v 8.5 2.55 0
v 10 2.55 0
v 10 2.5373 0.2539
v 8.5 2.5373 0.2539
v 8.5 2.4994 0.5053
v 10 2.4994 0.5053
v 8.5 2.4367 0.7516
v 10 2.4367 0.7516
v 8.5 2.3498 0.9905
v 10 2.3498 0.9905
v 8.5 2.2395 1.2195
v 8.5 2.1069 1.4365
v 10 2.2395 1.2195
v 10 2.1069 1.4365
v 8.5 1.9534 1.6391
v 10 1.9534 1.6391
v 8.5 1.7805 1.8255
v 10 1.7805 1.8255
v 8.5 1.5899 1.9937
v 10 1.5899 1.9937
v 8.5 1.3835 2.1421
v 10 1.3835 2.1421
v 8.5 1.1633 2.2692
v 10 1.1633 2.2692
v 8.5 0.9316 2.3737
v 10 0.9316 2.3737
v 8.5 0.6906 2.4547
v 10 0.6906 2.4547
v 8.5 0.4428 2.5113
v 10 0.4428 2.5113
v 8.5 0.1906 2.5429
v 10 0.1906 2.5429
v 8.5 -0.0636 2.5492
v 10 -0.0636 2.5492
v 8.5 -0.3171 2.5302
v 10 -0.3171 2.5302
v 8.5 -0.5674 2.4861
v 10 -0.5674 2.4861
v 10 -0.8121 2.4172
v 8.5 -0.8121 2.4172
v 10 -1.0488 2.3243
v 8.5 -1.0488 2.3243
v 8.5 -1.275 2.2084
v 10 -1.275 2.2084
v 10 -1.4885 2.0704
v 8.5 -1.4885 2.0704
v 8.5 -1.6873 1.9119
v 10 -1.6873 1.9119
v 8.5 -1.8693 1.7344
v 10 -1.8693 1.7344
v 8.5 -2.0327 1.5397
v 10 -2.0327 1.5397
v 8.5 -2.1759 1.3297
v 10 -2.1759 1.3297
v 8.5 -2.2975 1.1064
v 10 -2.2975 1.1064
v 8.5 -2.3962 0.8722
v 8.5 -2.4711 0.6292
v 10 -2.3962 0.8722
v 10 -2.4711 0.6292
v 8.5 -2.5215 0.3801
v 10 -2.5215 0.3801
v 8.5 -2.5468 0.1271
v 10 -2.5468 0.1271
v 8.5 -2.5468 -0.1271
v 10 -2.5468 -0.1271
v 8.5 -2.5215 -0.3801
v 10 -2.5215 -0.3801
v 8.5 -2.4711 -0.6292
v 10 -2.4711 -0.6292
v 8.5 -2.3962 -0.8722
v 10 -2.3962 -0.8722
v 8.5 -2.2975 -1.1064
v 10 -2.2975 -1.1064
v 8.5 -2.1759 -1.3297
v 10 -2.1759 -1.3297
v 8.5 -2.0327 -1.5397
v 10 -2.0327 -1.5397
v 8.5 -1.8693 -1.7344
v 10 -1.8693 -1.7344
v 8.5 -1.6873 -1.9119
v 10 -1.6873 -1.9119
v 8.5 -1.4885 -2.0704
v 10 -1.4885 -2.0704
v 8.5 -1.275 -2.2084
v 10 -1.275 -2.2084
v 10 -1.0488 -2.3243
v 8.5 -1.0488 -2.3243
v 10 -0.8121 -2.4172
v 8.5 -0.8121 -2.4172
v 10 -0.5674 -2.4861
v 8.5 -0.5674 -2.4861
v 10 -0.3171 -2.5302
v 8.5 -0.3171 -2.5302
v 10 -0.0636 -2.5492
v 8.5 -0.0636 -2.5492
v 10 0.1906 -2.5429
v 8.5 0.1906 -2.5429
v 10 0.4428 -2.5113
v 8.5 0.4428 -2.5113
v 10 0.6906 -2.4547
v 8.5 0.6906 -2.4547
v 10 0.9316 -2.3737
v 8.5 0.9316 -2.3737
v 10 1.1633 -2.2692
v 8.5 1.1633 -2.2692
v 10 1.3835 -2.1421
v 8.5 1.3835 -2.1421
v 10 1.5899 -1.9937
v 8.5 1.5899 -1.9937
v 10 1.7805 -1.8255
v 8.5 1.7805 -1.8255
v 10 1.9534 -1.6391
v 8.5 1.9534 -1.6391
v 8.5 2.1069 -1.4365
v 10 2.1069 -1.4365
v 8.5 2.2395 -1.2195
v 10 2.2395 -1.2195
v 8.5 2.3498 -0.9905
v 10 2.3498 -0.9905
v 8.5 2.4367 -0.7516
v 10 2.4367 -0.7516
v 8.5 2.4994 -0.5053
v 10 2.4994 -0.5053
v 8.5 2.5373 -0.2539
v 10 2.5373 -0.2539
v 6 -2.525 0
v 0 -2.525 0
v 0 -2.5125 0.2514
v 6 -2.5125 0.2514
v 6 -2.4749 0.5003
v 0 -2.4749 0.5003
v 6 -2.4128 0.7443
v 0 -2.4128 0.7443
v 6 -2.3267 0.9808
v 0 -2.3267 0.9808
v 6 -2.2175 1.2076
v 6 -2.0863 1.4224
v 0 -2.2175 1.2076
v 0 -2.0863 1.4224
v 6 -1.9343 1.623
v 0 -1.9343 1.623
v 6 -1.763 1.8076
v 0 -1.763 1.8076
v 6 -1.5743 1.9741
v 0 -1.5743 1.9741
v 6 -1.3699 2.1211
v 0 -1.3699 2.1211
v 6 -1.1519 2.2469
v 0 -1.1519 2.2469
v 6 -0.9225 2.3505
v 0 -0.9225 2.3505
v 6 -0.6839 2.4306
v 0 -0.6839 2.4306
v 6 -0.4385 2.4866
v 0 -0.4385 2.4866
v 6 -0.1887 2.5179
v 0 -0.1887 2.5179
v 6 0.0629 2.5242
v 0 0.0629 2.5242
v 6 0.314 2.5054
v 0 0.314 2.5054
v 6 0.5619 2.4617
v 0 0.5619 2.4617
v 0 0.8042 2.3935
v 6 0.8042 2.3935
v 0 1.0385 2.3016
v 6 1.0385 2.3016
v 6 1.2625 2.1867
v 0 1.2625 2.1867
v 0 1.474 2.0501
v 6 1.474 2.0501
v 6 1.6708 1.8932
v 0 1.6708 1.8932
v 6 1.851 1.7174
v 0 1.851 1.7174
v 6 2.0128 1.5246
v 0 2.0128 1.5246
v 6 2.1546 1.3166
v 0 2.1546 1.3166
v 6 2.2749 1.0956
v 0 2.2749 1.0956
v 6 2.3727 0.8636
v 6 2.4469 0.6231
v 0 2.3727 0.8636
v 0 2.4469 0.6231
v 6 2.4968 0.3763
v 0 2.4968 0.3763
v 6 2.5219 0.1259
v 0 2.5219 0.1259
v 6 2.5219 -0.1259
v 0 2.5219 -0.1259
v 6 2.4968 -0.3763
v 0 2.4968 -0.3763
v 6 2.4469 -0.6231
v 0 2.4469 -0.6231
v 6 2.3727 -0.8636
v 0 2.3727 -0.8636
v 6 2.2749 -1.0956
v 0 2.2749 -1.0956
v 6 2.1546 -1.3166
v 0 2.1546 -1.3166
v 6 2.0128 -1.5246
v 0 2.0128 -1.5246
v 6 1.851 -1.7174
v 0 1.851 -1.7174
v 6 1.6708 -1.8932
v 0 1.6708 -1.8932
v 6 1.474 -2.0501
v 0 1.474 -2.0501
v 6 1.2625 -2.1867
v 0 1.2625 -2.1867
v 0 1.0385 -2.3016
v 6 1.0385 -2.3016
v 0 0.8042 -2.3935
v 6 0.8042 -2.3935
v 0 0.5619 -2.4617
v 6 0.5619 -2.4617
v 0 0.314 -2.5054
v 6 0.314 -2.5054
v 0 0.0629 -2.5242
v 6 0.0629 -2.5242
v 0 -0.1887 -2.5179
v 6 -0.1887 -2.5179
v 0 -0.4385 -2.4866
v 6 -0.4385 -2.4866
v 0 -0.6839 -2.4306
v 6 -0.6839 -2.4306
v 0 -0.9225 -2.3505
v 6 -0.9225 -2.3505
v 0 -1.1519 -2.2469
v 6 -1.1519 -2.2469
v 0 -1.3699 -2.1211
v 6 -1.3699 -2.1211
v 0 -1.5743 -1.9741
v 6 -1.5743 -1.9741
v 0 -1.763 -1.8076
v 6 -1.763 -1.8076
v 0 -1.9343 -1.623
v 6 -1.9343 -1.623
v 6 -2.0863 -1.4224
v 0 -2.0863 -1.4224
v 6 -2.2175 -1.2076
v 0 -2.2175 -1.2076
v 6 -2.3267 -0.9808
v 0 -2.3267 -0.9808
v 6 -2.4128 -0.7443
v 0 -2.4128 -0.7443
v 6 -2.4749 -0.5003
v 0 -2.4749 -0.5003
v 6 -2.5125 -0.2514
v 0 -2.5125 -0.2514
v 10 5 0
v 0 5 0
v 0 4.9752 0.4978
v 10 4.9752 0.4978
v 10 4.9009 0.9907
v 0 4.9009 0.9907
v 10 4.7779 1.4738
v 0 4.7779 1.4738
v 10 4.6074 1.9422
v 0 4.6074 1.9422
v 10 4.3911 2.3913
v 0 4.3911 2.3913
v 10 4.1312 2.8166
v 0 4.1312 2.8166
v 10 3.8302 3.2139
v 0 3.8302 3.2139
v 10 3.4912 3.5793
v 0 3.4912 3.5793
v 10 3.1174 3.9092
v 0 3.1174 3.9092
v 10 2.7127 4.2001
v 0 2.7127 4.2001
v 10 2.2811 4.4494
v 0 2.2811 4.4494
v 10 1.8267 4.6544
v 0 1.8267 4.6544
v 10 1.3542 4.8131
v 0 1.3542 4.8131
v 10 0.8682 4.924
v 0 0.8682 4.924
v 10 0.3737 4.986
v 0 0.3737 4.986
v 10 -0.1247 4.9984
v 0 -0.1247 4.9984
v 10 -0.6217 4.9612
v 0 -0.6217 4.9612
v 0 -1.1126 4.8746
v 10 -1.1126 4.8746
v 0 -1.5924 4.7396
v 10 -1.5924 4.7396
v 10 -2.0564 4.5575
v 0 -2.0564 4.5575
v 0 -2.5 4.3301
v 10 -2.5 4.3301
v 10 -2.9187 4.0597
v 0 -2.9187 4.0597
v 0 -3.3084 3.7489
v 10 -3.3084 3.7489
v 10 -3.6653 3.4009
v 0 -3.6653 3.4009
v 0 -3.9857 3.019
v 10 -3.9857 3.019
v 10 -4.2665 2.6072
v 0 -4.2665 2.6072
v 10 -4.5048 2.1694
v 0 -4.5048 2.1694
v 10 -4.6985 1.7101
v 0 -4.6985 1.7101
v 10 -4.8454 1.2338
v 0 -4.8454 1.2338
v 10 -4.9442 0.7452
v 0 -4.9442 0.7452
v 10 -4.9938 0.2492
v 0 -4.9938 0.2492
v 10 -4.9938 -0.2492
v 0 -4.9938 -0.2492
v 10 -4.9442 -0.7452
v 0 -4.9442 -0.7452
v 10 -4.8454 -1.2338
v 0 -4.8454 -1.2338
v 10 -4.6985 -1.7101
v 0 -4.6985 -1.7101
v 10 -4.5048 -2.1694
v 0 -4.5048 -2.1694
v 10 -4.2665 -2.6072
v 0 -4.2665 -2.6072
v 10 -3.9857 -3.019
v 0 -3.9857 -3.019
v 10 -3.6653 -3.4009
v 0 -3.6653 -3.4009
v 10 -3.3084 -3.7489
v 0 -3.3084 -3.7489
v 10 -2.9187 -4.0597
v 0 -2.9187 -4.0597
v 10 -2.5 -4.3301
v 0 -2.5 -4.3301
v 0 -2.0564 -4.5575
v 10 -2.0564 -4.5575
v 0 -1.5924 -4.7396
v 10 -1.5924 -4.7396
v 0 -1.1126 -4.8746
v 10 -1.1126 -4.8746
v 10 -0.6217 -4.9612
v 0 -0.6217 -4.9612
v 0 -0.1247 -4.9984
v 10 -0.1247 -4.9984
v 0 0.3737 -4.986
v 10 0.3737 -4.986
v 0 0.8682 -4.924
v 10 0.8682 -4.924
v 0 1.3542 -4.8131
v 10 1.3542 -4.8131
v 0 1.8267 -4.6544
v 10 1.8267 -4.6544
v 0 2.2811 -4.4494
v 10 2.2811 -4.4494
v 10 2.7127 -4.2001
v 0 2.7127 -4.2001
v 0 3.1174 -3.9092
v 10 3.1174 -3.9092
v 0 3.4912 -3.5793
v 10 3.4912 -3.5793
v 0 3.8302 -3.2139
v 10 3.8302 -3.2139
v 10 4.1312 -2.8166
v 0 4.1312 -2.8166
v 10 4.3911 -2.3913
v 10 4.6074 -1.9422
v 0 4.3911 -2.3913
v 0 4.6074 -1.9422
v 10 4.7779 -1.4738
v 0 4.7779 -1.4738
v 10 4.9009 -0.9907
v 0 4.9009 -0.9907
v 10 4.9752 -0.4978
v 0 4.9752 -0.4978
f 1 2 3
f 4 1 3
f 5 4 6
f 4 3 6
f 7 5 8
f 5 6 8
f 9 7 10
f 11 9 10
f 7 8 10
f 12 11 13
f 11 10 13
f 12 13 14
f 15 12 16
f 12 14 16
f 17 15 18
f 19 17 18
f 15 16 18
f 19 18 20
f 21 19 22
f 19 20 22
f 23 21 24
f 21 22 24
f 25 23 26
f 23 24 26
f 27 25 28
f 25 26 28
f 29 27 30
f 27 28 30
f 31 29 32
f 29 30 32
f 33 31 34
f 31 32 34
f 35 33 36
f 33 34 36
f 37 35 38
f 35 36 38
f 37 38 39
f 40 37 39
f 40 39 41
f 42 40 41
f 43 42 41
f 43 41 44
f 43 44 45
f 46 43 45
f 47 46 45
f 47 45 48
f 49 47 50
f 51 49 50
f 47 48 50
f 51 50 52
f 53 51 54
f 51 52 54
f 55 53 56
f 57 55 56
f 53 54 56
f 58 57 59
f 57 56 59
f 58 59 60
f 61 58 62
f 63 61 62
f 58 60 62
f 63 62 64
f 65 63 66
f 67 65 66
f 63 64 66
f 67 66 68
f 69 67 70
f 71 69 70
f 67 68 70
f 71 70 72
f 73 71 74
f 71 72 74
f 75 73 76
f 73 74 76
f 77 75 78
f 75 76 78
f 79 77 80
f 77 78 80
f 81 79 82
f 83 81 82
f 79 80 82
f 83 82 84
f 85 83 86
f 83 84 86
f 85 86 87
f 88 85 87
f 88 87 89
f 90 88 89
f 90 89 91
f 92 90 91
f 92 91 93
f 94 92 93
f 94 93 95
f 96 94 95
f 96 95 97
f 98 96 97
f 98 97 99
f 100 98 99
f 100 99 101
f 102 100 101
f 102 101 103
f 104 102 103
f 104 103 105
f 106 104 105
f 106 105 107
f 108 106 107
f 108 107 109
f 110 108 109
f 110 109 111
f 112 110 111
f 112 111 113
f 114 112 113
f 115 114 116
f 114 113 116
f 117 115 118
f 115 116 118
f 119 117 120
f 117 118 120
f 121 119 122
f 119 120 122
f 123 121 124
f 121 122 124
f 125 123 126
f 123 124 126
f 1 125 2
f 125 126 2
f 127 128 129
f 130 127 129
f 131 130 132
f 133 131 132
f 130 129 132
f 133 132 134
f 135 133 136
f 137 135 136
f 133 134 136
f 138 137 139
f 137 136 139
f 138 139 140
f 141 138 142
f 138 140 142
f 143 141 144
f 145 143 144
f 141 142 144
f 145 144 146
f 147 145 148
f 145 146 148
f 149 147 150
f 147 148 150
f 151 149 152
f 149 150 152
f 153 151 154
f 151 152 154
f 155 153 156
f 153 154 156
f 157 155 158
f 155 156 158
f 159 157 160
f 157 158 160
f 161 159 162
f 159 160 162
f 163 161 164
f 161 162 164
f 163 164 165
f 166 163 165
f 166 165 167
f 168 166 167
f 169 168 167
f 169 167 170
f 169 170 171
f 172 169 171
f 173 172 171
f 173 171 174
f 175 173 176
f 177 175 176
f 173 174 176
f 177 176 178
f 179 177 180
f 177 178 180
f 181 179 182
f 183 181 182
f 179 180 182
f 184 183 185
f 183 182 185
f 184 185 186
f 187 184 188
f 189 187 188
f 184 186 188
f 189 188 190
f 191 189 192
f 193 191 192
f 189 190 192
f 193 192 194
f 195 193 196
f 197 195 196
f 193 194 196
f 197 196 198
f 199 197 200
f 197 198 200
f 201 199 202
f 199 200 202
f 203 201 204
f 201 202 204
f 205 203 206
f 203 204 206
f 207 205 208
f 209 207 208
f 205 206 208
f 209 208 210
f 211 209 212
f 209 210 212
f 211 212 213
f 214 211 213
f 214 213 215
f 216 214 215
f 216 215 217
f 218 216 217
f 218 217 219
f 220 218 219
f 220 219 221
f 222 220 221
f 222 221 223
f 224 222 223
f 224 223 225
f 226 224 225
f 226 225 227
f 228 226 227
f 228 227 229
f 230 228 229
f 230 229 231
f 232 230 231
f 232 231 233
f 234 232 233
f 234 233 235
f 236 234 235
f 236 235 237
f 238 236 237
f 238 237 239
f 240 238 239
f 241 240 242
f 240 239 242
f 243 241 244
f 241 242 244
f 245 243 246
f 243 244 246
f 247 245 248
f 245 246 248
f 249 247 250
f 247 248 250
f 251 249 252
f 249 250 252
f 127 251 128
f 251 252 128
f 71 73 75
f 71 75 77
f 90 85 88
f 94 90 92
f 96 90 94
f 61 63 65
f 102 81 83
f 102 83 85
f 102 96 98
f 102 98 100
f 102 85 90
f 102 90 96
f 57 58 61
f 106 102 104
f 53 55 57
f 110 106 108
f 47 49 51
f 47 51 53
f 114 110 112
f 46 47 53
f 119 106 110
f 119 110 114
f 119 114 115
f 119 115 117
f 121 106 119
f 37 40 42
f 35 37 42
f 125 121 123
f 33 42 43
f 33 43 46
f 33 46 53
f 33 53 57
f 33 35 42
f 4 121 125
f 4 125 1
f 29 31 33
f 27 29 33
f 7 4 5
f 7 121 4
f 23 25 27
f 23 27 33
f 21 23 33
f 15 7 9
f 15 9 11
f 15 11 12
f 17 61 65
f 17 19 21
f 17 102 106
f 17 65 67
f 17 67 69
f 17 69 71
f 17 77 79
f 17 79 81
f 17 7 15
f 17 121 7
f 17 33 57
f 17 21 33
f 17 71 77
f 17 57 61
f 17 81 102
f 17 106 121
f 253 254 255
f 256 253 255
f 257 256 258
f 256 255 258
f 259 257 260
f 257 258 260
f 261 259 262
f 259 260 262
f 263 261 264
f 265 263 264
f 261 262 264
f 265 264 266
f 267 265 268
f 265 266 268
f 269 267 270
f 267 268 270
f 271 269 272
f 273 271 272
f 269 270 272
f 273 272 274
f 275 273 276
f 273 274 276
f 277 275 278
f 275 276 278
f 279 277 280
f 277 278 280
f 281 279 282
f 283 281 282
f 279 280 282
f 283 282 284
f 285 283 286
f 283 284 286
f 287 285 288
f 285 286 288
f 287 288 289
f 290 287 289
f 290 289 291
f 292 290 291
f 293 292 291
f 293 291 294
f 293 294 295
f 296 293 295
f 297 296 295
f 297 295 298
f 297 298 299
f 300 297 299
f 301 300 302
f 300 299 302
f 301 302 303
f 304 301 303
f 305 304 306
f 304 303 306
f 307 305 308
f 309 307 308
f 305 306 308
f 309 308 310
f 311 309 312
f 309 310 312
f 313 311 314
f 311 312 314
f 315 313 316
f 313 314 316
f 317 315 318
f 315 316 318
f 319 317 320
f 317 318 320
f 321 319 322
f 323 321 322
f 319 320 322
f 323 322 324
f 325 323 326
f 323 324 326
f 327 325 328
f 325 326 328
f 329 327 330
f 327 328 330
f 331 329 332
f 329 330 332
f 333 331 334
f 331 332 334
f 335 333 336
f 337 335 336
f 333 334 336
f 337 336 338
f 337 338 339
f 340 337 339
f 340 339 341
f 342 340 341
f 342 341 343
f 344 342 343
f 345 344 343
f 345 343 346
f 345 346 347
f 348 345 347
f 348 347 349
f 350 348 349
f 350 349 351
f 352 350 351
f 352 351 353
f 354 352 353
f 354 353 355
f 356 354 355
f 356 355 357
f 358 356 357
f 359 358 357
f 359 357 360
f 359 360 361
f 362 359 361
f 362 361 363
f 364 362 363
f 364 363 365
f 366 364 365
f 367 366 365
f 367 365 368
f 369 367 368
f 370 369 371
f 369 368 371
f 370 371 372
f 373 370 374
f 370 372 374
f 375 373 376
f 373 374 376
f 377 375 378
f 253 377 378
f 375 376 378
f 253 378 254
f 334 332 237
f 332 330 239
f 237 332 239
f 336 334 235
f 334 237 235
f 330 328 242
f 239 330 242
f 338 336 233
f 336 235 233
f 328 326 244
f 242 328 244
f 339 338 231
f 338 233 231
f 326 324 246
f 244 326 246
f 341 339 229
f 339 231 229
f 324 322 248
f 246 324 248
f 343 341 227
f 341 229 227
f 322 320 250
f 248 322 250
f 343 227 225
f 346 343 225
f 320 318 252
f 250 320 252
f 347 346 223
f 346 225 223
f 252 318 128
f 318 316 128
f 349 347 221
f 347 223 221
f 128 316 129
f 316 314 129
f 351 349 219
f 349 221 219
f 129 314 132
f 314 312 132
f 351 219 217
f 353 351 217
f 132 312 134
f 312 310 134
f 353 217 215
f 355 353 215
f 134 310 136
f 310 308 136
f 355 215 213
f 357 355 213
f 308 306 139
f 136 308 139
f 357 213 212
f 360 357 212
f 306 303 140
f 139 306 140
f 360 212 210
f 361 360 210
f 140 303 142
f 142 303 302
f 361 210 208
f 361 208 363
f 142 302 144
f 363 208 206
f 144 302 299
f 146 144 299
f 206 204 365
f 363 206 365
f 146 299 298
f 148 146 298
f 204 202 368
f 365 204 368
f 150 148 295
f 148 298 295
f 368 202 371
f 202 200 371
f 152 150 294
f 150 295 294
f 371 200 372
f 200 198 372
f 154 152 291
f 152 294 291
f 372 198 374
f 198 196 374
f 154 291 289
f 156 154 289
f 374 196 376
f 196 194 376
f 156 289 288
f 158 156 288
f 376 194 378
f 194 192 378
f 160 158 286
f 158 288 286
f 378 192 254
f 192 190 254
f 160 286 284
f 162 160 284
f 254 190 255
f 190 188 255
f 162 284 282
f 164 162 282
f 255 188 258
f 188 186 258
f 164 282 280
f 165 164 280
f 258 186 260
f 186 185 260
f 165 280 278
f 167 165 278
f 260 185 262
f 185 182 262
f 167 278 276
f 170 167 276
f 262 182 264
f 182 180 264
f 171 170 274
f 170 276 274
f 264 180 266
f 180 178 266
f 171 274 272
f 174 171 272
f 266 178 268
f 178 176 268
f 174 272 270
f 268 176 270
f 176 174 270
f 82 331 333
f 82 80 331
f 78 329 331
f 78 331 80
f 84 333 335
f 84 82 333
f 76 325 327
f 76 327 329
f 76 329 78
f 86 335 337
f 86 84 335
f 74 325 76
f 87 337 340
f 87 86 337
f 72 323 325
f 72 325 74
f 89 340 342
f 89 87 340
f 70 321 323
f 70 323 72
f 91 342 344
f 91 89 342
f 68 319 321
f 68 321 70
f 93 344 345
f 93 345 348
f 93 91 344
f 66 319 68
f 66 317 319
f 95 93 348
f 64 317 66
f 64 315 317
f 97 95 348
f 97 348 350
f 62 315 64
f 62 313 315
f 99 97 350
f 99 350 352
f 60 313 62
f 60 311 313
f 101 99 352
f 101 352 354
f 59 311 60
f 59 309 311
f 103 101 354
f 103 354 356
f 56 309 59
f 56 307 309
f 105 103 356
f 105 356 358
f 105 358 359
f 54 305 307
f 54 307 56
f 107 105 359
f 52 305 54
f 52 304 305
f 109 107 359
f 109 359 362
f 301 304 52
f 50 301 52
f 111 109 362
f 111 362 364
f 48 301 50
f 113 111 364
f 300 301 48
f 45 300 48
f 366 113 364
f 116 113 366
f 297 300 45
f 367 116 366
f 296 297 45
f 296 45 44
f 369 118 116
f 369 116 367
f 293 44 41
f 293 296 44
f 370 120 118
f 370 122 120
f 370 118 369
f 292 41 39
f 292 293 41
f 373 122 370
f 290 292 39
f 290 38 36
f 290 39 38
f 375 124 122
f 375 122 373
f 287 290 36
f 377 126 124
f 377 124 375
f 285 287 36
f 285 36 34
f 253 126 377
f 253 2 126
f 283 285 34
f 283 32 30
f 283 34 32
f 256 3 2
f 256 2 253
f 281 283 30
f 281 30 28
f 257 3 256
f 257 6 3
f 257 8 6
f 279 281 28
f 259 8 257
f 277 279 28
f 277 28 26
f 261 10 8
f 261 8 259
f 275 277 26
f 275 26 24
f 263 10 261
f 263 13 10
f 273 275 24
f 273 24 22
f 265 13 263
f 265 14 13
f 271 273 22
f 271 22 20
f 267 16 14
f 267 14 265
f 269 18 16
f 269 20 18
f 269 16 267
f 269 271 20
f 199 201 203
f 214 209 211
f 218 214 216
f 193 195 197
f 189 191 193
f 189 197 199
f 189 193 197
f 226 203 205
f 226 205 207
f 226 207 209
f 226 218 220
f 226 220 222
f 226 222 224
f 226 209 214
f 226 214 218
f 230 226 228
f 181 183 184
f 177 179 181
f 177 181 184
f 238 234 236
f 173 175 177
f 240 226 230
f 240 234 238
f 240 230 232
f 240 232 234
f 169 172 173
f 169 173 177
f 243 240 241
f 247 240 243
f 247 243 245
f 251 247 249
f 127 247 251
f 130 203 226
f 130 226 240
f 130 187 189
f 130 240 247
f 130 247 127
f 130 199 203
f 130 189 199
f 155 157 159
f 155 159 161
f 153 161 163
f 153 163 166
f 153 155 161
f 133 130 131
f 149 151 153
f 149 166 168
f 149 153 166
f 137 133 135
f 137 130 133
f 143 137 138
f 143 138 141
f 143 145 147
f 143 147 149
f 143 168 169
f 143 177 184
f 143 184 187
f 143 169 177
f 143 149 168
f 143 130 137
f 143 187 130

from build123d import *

# Parameters (mm, degrees)
SKETCH1_R           = 5
BOSS_EXTRUDE1_DEPTH = 10
SKETCH2_R           = 2.55
CUT_EXTRUDE1_DEPTH  = 1.5
SKETCH4_R           = 2.525
CUT_EXTRUDE2_DEPTH  = 6


with BuildPart() as part:
    # Sketch1 → Boss-Extrude1 (new body)
    with BuildSketch(Plane.YZ):
        Circle(SKETCH1_R)
    extrude(amount=BOSS_EXTRUDE1_DEPTH)

    # Sketch2 → Cut-Extrude1 (cut)
    with BuildSketch(Plane.YZ.offset(10)):
        Circle(SKETCH2_R)
    extrude(amount=-CUT_EXTRUDE1_DEPTH, mode=Mode.SUBTRACT)

    # Sketch4 → Cut-Extrude2 (cut)
    with BuildSketch(Plane(origin=(0, 0, 0), x_dir=(0, -1, 0), z_dir=(-1, 0, 0))):
        Circle(SKETCH4_R)
    extrude(amount=-CUT_EXTRUDE2_DEPTH, mode=Mode.SUBTRACT)


solid = part.part
